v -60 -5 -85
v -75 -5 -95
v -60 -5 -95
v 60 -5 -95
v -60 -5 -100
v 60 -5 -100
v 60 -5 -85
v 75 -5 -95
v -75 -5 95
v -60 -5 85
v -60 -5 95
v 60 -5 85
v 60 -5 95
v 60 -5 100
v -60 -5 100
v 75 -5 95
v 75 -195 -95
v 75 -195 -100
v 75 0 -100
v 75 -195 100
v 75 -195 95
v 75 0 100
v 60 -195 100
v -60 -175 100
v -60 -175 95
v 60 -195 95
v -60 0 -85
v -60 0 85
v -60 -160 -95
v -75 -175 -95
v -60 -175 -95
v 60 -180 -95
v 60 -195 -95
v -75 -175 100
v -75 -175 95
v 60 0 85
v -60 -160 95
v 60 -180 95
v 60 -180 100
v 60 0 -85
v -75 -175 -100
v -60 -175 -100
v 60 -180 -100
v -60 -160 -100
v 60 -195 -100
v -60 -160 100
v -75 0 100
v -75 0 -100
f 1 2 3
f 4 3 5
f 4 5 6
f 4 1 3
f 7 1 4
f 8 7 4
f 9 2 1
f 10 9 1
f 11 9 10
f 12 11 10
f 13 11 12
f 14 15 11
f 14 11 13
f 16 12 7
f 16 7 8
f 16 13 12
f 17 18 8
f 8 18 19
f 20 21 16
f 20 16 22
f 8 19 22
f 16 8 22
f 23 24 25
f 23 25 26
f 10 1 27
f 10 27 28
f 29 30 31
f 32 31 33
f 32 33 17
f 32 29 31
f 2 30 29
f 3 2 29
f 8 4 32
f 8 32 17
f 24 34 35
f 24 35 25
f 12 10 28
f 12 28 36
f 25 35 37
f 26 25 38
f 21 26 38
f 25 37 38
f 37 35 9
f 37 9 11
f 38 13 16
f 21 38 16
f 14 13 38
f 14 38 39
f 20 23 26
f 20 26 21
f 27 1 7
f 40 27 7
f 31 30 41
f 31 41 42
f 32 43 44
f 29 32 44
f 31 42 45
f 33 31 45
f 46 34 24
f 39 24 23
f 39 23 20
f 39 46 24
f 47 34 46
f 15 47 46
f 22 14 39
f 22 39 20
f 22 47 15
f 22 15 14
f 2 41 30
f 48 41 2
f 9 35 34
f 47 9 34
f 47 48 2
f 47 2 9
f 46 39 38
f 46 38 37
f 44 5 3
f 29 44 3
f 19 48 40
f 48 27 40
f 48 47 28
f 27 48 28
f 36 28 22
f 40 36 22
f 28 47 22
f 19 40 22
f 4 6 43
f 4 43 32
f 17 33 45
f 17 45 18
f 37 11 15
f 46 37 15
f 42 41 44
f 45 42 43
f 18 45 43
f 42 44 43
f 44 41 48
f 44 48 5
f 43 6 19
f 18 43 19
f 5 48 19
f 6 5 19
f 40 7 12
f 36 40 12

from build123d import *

# Parameters (mm, degrees)
F0_W      = 150
F0_H      = 200
F1_DEPTH  = 5
F2_W      = 15
F2_H      = 5
F3_DEPTH  = 190
F4_W      = 15
F4_H      = 5
F5_DEPTH  = 170
F7_DEPTH  = 5
F9_W      = 120
F9_H      = 170
F10_DEPTH = 25


with BuildPart() as f1:
    # F0 (on Front) → F1 (new body)
    with BuildSketch(Plane.XZ):
        Rectangle(F0_W, F0_H)
    extrude(amount=F1_DEPTH)

    # F2 (on face) → F3 (join)
    with BuildSketch(Plane.XZ.offset(5)):
        with Locations((67.5, 97.5)):
            Rectangle(F2_W, F2_H)
        with Locations((67.5, -97.5)):
            Rectangle(F2_W, F2_H)
    extrude(amount=F3_DEPTH)

    # F4 (on face) → F5 (join)
    with BuildSketch(Plane.XZ.offset(5)):
        with Locations((-67.5, 97.5)):
            Rectangle(F4_W, F4_H)
        with Locations((-67.5, -97.5)):
            Rectangle(F4_W, F4_H)
    extrude(amount=F5_DEPTH)

    # F6 (on face) → F7 (join)
    with BuildSketch(Plane.XY.offset(100)):
        Polygon((-60, -160), (-60, -175), (60, -195), (60, -180), align=None)
    extrude(amount=-F7_DEPTH)

    # F8: F1 across plane


with BuildPart() as f1_1:
    add(f1.part)
    add(f1.part.mirror(Plane.XY))

    # F9 (on face) → F10 (cut)
    with BuildSketch(Plane.XZ.offset(5)):
        Rectangle(F9_W, F9_H)
    extrude(amount=-F10_DEPTH, mode=Mode.SUBTRACT)


solid = f1_1.part
